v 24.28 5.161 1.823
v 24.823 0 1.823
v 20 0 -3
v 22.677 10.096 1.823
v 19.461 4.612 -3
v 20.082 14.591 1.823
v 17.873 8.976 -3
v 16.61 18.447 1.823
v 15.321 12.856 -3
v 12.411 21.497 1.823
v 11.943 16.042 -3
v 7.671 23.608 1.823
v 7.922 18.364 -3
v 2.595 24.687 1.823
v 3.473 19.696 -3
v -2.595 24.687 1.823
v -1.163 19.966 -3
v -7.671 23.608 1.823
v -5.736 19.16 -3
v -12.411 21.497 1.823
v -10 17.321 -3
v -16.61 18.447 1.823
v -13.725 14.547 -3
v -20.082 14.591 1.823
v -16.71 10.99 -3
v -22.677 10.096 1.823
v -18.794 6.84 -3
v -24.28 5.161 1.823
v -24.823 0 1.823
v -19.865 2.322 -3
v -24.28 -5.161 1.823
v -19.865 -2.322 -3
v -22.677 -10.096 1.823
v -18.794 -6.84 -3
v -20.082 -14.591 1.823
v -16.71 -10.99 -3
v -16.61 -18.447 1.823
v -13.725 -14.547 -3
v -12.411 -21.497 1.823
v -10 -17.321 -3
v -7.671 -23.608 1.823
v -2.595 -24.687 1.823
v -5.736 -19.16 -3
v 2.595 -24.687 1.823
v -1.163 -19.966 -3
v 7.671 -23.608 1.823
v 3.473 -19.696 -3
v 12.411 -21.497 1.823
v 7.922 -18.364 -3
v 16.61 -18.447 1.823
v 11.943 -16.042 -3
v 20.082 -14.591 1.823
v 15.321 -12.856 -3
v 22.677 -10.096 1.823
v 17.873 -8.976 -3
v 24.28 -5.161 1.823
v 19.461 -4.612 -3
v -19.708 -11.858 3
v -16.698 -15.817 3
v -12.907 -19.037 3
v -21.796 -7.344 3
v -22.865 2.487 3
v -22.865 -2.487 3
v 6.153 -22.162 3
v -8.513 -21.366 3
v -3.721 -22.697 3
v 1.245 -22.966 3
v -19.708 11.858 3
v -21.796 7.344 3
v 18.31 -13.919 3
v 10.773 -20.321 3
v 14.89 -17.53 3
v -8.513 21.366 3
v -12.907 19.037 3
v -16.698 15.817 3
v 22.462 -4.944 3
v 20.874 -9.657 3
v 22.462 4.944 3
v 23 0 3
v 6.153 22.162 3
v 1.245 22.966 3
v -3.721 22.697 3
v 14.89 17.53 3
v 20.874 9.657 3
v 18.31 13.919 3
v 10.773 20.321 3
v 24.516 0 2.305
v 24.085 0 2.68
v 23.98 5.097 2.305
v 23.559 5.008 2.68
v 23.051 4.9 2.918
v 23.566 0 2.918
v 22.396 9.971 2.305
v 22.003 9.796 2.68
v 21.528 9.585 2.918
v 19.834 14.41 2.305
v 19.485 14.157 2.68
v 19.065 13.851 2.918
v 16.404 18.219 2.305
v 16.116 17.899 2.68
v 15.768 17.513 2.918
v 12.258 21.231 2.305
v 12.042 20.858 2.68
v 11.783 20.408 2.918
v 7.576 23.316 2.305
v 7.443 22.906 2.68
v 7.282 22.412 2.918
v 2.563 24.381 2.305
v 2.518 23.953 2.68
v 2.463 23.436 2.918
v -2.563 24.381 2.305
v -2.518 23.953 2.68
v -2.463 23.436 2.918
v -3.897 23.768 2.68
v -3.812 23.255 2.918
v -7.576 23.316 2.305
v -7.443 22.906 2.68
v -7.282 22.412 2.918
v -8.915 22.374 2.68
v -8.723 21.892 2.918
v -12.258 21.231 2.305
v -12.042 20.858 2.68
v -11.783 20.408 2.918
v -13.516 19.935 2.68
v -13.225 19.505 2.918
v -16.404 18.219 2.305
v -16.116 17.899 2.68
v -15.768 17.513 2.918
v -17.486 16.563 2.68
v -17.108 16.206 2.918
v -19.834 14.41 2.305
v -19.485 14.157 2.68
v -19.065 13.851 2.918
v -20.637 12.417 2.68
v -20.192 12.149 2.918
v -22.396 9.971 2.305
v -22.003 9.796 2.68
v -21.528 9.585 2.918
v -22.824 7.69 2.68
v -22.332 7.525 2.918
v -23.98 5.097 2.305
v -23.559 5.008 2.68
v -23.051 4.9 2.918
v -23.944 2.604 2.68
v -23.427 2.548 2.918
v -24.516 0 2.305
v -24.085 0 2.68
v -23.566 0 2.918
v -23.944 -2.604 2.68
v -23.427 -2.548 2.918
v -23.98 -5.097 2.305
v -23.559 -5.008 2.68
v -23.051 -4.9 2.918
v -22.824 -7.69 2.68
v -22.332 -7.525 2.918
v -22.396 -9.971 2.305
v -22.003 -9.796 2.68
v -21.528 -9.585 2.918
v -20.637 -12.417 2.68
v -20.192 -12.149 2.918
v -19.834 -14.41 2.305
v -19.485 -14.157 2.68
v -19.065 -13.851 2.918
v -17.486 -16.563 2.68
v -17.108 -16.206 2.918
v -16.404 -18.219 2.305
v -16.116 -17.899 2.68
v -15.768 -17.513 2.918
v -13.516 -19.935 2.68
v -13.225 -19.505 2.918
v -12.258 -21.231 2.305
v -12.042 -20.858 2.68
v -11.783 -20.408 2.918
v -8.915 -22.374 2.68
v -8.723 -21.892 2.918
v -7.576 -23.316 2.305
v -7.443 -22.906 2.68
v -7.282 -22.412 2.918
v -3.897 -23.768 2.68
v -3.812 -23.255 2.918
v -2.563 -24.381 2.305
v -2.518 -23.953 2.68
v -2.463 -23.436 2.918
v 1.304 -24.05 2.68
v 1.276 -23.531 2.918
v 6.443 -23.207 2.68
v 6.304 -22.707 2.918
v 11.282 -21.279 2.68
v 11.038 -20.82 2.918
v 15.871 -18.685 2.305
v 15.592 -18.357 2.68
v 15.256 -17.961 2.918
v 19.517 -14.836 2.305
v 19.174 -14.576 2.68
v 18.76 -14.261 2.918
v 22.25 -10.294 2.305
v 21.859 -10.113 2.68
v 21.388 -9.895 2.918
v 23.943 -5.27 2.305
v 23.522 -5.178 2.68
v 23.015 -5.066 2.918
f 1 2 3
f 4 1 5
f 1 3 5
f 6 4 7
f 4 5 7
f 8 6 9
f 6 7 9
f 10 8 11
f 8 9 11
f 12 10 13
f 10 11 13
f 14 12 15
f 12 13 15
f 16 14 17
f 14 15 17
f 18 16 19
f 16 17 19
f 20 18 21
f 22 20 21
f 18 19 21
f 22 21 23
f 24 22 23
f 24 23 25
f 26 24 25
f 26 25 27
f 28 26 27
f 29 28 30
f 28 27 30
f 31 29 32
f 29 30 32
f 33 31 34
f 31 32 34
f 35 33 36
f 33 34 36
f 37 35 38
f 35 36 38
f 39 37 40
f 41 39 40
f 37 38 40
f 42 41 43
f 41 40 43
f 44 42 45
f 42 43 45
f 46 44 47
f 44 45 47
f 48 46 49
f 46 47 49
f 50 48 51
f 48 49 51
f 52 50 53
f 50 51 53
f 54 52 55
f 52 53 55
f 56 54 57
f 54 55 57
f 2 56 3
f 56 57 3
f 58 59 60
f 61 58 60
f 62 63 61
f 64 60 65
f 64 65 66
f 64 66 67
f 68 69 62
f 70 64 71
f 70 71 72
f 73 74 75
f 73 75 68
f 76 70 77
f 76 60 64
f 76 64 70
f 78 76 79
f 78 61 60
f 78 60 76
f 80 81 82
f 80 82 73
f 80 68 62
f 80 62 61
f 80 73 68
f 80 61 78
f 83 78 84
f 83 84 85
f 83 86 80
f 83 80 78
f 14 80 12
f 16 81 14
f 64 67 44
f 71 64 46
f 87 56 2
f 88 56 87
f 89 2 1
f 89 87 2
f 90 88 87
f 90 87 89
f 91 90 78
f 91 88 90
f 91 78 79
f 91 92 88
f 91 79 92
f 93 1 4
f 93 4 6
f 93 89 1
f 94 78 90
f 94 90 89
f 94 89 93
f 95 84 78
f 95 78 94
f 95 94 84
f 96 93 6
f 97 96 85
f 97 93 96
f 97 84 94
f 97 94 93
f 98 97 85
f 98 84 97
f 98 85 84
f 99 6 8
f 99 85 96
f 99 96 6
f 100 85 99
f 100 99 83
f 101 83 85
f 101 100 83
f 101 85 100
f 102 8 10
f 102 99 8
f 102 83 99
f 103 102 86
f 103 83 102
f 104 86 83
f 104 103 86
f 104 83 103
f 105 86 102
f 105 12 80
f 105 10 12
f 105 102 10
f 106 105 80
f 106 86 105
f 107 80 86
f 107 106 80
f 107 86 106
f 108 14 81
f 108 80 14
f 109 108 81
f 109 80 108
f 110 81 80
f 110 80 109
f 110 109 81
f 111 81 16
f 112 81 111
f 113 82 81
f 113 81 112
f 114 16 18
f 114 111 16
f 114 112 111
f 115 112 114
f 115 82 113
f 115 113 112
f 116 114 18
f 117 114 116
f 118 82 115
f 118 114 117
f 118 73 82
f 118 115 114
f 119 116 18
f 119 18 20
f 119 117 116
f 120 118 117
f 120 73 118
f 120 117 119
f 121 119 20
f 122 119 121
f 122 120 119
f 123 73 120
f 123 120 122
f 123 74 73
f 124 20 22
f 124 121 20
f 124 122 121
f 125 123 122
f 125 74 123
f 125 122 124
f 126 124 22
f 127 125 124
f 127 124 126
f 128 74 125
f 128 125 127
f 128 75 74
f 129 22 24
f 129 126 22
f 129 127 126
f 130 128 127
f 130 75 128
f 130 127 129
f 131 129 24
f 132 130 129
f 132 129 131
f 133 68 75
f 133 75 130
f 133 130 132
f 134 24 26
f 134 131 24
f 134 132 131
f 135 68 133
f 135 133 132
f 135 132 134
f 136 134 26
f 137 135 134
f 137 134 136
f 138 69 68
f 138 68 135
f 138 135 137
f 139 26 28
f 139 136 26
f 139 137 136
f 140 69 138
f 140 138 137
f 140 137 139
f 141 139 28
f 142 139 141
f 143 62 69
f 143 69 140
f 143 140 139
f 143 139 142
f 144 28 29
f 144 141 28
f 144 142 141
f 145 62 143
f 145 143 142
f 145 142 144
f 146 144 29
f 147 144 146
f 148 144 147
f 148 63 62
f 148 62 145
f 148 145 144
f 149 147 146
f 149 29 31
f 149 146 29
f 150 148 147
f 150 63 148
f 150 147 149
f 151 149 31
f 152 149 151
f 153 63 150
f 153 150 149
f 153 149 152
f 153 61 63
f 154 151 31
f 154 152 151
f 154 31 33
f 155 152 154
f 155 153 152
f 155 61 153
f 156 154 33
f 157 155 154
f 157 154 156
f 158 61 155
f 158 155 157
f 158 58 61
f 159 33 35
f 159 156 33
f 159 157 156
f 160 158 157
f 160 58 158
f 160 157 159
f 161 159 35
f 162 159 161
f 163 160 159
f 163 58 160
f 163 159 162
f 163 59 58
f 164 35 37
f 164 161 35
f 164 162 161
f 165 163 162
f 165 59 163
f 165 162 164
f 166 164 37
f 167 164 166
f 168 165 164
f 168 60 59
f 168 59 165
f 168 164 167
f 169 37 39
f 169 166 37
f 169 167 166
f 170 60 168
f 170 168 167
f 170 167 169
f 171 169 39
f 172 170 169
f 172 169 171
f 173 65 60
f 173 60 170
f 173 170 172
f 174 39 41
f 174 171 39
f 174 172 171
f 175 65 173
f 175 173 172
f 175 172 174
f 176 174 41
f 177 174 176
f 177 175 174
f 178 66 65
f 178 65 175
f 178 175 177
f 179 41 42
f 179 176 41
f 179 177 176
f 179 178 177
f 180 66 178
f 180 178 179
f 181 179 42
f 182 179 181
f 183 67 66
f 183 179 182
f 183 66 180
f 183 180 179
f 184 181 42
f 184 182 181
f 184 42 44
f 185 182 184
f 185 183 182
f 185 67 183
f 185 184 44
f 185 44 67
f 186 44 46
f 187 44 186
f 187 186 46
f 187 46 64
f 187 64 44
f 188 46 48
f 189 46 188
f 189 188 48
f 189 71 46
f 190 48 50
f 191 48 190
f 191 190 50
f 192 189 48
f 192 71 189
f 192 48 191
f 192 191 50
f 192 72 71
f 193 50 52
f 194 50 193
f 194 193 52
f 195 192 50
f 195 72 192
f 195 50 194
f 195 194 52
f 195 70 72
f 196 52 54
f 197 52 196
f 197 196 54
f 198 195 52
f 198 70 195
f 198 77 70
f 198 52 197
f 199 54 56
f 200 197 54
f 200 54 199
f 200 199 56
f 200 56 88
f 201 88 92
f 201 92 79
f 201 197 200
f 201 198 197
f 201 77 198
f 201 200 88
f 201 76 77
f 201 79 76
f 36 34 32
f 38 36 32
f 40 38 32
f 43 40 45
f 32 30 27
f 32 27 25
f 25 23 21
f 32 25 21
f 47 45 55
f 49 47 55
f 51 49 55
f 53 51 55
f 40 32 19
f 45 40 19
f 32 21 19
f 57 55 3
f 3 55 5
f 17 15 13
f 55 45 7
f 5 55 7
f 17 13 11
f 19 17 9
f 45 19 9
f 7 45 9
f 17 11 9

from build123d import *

# Parameters (mm, degrees)
F0_R     = 25
F1_DEPTH = 3
F2_R     = 2


# Not quite as in the source:
# - a fillet or chamfer that OpenCascade refuses, or shapes differently, is made with other operations: its cross-section is extruded or revolved along the edge and cut away or added


with BuildPart() as f1:
    # F0 (on Top) → F1 (new body, symmetric)
    with BuildSketch(Plane.XY):
        Circle(F0_R)
    extrude(amount=F1_DEPTH, both=True)

    # F2
    f2_edges = [f1.edges().sort_by_distance(p)[0] for p in [
        (-25, 0, 3),
    ]]
    fillet(f2_edges, radius=F2_R)

    # F3: chamfer of 5 on 1 edges, made by hand

    # F3_s1 → F3_t2 (revolve, cut)
    with BuildSketch(Plane.XZ):
        Polygon((25, 2), (20, -3), (25, -3), align=None)
    revolve(axis=Axis((0, 0, -3), (0, 0, 1)), mode=Mode.SUBTRACT)


solid = f1.part
